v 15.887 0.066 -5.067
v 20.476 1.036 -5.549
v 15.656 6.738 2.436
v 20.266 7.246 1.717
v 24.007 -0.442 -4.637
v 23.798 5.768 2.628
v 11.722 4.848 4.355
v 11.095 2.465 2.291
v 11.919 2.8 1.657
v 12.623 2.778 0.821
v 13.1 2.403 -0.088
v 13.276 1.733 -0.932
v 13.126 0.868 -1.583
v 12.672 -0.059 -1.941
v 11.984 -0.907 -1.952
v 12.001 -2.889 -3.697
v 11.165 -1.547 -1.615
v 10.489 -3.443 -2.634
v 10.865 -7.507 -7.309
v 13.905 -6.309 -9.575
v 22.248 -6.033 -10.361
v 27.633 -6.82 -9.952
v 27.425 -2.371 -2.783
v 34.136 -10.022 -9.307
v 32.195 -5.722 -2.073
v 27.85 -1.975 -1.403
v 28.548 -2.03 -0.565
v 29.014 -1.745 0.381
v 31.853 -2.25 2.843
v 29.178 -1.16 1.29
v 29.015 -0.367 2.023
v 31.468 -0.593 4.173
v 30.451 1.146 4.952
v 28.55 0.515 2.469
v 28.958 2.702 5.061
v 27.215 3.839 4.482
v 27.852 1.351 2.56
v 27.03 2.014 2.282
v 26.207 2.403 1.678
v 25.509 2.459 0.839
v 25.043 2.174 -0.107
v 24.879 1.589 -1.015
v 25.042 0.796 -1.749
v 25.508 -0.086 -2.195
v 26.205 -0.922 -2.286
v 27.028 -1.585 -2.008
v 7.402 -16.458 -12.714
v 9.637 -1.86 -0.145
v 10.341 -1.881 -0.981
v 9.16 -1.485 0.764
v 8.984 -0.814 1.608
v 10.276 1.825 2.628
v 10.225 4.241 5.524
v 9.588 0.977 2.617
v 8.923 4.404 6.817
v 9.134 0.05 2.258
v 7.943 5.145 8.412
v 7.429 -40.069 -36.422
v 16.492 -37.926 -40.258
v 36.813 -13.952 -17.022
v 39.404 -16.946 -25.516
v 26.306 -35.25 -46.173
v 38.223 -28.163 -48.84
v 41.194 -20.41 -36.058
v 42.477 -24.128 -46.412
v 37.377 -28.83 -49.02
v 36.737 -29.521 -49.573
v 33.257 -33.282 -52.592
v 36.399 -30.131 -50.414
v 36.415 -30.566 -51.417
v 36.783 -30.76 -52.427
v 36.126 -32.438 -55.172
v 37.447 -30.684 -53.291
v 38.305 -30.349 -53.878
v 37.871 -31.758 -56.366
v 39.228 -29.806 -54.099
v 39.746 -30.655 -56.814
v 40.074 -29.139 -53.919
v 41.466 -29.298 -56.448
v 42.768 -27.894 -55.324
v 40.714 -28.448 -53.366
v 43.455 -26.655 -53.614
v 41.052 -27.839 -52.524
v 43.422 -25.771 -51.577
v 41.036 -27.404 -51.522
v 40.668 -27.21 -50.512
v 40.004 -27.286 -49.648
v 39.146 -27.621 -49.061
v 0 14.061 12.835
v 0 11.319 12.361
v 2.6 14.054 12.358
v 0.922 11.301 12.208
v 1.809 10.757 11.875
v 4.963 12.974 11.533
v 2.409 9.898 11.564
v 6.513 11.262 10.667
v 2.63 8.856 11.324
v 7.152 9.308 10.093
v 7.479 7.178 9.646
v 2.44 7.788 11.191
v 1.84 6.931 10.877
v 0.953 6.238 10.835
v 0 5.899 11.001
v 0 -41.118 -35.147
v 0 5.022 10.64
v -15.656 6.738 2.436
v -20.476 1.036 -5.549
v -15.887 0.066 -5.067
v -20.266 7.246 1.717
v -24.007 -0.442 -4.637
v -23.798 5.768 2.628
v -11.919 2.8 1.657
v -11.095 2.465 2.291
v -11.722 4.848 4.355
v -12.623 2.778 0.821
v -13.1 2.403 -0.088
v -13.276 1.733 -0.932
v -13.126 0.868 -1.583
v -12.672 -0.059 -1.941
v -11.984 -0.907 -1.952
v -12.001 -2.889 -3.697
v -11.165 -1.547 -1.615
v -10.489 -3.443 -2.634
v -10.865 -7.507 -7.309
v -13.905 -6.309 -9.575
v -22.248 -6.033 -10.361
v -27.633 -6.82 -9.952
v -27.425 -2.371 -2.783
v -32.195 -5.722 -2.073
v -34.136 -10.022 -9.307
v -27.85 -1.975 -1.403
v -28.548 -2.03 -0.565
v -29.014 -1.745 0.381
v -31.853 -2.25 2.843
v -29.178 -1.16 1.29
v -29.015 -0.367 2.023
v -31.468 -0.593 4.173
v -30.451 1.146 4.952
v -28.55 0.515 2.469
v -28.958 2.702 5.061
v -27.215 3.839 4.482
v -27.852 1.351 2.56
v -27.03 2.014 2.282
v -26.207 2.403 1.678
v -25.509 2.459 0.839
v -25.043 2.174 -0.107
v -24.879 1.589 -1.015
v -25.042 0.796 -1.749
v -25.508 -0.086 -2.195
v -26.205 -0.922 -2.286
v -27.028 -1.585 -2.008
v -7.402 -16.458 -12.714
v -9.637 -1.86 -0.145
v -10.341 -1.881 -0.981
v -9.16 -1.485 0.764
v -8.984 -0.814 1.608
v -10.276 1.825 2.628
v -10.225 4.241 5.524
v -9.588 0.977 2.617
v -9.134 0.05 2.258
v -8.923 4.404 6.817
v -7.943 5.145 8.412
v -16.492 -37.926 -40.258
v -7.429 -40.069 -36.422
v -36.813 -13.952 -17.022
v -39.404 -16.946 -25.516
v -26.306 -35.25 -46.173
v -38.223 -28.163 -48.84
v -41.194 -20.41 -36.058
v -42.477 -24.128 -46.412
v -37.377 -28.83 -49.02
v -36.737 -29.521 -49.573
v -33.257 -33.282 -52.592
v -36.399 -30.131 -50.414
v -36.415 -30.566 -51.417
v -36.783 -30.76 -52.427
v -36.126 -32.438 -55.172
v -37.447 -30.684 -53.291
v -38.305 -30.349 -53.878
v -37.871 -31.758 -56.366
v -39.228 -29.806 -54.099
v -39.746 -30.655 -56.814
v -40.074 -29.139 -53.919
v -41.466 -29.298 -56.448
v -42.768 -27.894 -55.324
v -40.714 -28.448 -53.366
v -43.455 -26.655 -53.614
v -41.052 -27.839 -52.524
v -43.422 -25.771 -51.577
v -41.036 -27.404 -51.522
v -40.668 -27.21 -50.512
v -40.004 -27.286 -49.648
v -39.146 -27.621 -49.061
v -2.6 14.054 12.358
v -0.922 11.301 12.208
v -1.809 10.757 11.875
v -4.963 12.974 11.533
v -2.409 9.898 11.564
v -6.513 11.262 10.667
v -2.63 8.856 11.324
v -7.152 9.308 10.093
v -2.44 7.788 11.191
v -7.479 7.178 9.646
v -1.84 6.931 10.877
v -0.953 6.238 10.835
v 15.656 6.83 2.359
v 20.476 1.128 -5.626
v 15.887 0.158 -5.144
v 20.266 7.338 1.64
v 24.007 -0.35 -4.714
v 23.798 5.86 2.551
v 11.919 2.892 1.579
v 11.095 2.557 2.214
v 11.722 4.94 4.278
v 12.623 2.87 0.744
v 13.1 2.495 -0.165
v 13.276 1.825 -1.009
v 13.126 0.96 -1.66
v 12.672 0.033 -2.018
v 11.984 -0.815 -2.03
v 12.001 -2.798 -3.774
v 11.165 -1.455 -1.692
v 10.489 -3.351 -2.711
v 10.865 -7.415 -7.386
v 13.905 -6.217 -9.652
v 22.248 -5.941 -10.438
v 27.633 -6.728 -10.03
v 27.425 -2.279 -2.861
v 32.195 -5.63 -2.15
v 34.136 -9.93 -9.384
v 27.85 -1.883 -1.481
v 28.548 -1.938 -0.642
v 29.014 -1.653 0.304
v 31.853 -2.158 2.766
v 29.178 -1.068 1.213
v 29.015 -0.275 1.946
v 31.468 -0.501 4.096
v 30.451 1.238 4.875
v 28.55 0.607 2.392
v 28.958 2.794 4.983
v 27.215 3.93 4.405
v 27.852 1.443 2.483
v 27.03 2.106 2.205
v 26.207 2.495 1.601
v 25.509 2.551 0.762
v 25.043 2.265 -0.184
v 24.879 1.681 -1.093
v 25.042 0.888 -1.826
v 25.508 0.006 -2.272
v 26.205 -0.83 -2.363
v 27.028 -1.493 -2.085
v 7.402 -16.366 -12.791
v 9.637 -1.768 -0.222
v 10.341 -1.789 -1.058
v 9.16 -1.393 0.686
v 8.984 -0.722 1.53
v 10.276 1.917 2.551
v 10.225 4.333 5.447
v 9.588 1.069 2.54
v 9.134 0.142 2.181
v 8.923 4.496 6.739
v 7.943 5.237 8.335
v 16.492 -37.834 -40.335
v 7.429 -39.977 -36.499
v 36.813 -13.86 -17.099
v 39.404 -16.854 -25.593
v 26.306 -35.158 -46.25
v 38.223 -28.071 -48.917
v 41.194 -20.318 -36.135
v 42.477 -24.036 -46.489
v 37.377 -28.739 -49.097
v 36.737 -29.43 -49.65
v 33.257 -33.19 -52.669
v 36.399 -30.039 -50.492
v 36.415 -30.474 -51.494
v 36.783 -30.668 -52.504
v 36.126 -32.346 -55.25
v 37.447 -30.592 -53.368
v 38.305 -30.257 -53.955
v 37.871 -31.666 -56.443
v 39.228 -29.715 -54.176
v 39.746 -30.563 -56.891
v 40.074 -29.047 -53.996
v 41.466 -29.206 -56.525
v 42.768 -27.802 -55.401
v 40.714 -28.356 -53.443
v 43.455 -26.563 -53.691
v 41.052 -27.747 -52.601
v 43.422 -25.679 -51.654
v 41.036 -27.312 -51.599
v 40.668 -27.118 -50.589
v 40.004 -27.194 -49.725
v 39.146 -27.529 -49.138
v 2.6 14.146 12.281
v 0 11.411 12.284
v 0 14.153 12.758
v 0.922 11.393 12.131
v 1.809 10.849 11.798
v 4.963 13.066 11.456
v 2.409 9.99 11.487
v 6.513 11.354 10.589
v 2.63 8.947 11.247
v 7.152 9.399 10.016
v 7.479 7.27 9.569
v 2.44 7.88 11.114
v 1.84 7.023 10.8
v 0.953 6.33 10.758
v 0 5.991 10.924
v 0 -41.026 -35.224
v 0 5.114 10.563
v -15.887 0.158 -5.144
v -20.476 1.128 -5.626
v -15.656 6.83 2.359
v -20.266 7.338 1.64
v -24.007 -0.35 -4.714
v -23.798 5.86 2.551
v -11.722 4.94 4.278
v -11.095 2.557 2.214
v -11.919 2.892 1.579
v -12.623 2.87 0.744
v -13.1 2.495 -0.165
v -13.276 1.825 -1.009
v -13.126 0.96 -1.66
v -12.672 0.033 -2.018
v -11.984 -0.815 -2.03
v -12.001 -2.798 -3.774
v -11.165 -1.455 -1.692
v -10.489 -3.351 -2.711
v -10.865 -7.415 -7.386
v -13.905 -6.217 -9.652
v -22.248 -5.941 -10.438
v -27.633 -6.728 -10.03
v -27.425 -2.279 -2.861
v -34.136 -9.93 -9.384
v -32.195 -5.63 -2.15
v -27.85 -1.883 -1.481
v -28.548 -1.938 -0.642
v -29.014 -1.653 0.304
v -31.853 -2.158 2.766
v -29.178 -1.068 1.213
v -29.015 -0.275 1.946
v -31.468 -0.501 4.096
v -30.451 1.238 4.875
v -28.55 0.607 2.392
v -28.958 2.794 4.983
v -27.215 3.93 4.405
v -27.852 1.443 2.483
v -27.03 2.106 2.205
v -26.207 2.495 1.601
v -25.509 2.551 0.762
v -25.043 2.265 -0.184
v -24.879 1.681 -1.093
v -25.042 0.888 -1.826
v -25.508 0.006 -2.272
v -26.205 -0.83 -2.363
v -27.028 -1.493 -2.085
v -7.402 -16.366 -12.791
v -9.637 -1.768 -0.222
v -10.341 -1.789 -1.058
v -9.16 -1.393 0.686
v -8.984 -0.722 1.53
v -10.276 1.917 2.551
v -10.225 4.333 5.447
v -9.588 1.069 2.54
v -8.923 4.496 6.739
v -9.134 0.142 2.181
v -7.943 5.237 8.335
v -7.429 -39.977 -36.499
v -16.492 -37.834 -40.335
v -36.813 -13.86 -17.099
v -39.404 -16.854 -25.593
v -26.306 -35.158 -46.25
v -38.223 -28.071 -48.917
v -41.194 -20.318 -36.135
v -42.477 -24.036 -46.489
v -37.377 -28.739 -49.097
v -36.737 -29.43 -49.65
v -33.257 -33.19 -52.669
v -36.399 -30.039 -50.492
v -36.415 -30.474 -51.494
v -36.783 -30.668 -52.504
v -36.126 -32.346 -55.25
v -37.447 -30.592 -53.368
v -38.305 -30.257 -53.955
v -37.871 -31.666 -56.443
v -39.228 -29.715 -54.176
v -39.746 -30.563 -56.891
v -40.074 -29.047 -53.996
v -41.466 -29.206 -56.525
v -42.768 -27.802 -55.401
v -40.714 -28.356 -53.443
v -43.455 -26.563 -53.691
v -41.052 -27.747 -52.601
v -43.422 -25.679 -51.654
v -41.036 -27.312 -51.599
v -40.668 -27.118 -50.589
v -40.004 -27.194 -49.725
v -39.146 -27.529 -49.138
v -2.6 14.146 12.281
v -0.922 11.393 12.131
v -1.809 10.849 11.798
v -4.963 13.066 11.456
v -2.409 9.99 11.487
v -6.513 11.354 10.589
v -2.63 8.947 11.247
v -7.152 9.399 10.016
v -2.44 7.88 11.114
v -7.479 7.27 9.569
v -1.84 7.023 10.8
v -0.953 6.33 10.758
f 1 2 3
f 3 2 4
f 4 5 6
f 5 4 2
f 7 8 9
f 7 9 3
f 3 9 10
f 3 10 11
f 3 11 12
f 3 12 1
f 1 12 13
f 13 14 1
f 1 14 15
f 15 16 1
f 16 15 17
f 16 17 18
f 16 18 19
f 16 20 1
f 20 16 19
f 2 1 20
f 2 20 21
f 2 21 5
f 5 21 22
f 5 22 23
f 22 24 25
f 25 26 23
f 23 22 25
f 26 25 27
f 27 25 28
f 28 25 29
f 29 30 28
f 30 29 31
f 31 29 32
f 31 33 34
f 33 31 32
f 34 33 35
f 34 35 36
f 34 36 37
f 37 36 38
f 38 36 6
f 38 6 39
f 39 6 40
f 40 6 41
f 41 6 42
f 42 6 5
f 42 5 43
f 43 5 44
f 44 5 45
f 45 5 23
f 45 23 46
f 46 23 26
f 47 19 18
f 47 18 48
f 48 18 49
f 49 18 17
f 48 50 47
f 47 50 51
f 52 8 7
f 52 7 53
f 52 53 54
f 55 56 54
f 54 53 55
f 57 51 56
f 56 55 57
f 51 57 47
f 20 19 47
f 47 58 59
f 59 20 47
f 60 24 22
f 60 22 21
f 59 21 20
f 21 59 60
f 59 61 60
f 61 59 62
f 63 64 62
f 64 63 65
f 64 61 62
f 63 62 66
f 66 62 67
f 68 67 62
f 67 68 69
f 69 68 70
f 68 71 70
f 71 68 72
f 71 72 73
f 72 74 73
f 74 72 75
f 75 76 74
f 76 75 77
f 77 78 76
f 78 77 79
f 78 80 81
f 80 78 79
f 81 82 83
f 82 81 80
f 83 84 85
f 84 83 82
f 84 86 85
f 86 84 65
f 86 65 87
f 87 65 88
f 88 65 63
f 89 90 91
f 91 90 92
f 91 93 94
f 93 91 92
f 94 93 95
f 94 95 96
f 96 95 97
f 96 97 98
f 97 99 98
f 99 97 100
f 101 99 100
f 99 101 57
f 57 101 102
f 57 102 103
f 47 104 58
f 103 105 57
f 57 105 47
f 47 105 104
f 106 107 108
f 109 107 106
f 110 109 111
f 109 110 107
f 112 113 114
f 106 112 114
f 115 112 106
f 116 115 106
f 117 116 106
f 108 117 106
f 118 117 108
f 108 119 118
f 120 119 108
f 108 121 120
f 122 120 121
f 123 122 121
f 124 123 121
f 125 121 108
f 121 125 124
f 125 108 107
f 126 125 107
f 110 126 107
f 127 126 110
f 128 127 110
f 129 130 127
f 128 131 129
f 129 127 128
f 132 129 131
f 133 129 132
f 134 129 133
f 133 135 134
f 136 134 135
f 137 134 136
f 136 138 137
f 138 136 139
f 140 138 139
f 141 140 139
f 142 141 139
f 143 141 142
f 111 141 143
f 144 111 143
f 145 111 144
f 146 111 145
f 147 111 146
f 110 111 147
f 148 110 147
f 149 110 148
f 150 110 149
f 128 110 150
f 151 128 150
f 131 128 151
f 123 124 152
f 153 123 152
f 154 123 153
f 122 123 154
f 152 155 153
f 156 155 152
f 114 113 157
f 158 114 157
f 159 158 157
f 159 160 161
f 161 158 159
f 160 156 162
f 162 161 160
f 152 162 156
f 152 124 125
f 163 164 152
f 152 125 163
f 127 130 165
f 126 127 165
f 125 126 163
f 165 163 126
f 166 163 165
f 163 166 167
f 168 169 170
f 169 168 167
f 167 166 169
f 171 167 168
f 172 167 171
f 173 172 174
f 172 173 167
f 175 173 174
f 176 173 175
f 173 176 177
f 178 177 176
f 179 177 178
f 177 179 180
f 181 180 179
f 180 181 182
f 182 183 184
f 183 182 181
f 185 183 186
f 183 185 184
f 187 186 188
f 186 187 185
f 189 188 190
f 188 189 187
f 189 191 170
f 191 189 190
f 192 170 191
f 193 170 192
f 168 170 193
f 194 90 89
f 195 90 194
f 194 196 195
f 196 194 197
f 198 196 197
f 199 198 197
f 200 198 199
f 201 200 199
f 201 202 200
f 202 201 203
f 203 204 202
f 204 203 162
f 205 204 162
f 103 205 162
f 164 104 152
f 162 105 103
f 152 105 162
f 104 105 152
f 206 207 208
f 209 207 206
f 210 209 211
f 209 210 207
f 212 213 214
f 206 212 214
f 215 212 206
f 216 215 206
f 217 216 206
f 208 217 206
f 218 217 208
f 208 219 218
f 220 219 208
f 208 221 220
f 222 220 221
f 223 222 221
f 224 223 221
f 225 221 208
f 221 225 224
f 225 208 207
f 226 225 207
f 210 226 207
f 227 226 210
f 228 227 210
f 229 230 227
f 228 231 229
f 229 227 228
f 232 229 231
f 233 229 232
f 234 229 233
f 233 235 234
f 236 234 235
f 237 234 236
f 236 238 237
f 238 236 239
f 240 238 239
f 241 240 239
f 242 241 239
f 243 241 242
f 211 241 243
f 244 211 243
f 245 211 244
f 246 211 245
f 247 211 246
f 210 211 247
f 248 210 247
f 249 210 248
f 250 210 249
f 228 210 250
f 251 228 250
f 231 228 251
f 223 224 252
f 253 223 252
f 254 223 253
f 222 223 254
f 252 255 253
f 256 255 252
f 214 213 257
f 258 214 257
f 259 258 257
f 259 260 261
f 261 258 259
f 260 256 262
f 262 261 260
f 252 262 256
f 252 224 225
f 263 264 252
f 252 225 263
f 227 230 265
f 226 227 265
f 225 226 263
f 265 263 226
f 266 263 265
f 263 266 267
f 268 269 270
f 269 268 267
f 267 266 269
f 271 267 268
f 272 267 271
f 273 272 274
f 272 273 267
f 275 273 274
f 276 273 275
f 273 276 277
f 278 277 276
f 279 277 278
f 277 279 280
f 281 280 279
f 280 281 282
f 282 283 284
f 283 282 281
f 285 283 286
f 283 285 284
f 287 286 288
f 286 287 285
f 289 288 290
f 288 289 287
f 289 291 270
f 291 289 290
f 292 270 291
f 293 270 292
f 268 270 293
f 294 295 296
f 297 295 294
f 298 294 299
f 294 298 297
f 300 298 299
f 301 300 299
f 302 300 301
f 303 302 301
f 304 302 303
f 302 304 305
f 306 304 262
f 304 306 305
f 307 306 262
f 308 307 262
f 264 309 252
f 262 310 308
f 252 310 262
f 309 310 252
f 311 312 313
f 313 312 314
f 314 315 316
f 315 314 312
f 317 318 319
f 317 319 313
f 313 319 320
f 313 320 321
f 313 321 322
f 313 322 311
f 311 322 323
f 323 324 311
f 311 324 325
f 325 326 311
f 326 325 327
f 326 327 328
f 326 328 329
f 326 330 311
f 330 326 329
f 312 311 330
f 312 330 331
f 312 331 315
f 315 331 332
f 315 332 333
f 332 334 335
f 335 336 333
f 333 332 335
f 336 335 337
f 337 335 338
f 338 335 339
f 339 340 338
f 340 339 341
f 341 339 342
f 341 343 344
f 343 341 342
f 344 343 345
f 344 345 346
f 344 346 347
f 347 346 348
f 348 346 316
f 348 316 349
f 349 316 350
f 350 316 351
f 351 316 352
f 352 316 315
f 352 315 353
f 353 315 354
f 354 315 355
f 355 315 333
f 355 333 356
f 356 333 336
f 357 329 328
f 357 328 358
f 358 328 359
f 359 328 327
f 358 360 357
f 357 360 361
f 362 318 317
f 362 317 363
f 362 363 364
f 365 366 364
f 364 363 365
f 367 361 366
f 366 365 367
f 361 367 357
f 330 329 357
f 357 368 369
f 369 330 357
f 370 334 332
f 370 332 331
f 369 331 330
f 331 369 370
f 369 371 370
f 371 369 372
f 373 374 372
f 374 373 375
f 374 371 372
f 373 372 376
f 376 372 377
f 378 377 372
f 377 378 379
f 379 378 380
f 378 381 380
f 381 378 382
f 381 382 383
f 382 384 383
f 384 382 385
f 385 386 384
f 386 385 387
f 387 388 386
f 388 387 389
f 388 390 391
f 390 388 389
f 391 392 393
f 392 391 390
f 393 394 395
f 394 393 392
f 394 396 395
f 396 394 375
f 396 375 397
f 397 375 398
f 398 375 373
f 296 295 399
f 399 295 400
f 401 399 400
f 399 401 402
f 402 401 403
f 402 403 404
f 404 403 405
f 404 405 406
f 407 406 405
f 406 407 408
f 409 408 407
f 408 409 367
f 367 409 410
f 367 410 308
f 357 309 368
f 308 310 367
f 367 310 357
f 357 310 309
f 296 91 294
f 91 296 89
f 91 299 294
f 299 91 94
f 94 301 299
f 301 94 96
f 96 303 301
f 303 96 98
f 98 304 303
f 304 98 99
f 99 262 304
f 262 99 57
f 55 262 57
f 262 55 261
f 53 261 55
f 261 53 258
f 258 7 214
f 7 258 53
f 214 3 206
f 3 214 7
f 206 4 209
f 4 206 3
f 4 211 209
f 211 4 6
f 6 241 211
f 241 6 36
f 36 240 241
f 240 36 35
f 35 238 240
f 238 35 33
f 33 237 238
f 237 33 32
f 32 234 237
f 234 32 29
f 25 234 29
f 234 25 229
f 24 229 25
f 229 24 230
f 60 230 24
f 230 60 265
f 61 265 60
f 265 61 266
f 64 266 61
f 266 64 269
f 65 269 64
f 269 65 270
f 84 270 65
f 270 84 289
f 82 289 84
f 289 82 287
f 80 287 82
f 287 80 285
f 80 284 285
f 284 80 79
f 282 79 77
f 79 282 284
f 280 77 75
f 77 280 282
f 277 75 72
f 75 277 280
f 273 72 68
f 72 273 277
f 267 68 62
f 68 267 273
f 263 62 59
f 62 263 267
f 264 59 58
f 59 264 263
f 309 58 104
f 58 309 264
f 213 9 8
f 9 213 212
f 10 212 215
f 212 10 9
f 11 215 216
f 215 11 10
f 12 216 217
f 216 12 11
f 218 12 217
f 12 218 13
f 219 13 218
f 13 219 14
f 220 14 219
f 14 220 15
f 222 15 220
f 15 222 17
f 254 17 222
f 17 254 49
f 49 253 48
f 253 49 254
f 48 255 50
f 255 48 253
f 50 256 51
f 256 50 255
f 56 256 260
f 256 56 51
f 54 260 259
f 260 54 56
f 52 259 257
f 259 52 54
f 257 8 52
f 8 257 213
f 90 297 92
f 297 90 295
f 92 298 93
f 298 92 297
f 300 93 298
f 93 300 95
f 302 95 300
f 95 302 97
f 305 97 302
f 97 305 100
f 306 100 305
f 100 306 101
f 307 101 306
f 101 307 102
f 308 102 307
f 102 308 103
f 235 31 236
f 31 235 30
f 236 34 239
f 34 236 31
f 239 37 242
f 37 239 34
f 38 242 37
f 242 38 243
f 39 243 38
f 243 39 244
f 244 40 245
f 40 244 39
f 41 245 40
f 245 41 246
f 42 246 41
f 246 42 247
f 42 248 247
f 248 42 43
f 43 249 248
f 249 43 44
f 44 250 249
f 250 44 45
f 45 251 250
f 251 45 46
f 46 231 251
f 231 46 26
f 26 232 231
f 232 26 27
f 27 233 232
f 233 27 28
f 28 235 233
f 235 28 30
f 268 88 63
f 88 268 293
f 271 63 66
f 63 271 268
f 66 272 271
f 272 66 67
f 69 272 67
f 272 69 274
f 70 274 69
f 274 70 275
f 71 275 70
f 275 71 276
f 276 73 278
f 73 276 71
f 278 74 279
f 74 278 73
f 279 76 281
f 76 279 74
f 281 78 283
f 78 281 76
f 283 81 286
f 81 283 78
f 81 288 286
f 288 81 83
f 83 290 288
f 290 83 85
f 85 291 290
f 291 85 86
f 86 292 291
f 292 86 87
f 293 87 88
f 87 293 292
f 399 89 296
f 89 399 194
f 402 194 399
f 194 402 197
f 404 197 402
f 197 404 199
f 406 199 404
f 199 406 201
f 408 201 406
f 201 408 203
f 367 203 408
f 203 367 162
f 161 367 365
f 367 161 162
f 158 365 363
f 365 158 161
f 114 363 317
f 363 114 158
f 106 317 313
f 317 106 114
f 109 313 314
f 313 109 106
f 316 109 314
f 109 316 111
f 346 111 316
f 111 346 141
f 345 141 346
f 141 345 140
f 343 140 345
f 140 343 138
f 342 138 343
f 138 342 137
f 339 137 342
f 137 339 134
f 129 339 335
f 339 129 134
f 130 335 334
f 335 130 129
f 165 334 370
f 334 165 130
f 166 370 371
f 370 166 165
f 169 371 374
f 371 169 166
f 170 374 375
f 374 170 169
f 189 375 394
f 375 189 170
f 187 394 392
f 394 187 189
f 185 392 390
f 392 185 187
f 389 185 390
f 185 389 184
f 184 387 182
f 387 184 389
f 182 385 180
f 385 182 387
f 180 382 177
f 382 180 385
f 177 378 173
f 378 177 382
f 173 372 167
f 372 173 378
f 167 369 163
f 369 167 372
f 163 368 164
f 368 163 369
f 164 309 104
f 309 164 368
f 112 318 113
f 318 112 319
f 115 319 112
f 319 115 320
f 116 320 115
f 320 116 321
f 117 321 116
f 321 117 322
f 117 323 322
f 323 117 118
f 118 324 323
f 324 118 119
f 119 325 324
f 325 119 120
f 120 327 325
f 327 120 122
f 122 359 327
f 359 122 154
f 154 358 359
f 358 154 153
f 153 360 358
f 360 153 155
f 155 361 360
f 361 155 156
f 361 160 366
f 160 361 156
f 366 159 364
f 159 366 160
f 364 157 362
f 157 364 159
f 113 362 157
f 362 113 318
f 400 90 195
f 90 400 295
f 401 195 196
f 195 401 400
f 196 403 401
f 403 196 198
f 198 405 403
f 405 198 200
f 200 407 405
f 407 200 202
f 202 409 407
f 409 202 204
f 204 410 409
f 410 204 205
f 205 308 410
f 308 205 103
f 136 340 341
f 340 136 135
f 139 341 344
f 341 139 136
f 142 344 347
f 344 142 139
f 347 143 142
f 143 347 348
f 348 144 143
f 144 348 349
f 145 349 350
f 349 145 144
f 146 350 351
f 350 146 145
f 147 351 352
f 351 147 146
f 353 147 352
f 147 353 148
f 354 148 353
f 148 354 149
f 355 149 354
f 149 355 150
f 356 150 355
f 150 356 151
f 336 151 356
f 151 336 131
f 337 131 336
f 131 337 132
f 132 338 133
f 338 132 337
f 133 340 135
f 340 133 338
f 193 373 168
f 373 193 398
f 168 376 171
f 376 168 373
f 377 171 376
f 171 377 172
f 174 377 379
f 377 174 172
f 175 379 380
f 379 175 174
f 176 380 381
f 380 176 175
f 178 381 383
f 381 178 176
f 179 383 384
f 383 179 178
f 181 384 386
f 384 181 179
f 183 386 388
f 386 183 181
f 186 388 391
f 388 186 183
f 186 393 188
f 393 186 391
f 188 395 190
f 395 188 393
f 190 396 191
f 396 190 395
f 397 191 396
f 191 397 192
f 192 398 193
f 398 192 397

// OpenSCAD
use <../lib.scad>
use <s/u767c02s01.scad>
use <s/u767c02s02.scad>
function ldraw_lib__u767c02() = [
// 0 Sail 12 x 10 Trapezoidal (Formed Shape 2)
// 0 Name: u767c02.dat
// 0 Author: Philippe Hurbain [Philo]
// 0 !LDRAW_ORG Part UPDATE 2025-04
// 0 !LICENSE Licensed under CC BY 4.0 : see CAreadme.txt
// 
// 0 !HELP Placement on mast:
// 0 !HELP 1 25 0 148 24 1 0 0 0 1 0 0 0 1 4318.dat
// 0 !HELP 1 25 0 -10 24 1 0 0 0 1 0 0 0 1 4733.dat
// 0 !HELP 1 25 0 -18 24 -1 0 0 0 1 0 0 0 -1 3957a.dat
// 0 !HELP 1 25 -18 0 24 0 1 0 -1 0 0 0 0 1 2555.dat
// 0 !HELP 1 25 18 0 24 0 -1 0 -1 0 0 0 0 -1 2555.dat
// 0 !HELP 1 25 0 0 6 0 0 -1 -1 0 0 0 1 0 2555.dat
// 0 !HELP 1 25 59 0 0 0 0 1 0 -1 0 1 0 0 3849.dat
// 
// 0 BFC CERTIFY CCW
  [0,"BFC","CERTIFY"],
  [0,"BFC","CCW"],
// 
// 0 !CATEGORY Sheet Fabric
// 0 !KEYWORDS Set 6261
// 
// 0 !HISTORY 2025-04-27 [OrionP] Official Update 2025-04
// 
// 
// 1 16 0 0 0 1 0 0 0 1 0 0 0 1 s\u767c02s01.dat
  [1,16,0,0,0,1,0,0,0,1,0,0,0,1, ldraw_lib__s__u767c02s01()],
// 1 16 0 0 0 -1 0 0 0 1 0 0 0 1 s\u767c02s01.dat
  [1,16,0,0,0,-1,0,0,0,1,0,0,0,1, ldraw_lib__s__u767c02s01()],
// 0 BFC INVERTNEXT
  [0,"BFC","INVERTNEXT"],
// 1 16 0 0.1928 0.2298 1 0 0 0 1 0 0 0 1 s\u767c02s01.dat
  [1,16,0,0.1928,0.2298,1,0,0,0,1,0,0,0,1, ldraw_lib__s__u767c02s01()],
// 0 BFC INVERTNEXT
  [0,"BFC","INVERTNEXT"],
// 1 16 0 0.1928 0.2298 -1 0 0 0 1 0 0 0 1 s\u767c02s01.dat
  [1,16,0,0.1928,0.2298,-1,0,0,0,1,0,0,0,1, ldraw_lib__s__u767c02s01()],
// 1 16 0 0 0 1 0 0 0 1 0 0 0 1 s\u767c02s02.dat
  [1,16,0,0,0,1,0,0,0,1,0,0,0,1, ldraw_lib__s__u767c02s02()],
// 1 16 0 0 0 -1 0 0 0 1 0 0 0 1 s\u767c02s02.dat
  [1,16,0,0,0,-1,0,0,0,1,0,0,0,1, ldraw_lib__s__u767c02s02()],
];
module ldraw_lib__u767c02(step=0, col=false, unit=2/5, alt=false, line=0.2, solid=!$preview)
    makepoly(ldraw_lib__u767c02(), step=step, col=col, unit=unit, alt=alt, line=line, solid=solid);
ldraw_lib__u767c02(line=0.2);
